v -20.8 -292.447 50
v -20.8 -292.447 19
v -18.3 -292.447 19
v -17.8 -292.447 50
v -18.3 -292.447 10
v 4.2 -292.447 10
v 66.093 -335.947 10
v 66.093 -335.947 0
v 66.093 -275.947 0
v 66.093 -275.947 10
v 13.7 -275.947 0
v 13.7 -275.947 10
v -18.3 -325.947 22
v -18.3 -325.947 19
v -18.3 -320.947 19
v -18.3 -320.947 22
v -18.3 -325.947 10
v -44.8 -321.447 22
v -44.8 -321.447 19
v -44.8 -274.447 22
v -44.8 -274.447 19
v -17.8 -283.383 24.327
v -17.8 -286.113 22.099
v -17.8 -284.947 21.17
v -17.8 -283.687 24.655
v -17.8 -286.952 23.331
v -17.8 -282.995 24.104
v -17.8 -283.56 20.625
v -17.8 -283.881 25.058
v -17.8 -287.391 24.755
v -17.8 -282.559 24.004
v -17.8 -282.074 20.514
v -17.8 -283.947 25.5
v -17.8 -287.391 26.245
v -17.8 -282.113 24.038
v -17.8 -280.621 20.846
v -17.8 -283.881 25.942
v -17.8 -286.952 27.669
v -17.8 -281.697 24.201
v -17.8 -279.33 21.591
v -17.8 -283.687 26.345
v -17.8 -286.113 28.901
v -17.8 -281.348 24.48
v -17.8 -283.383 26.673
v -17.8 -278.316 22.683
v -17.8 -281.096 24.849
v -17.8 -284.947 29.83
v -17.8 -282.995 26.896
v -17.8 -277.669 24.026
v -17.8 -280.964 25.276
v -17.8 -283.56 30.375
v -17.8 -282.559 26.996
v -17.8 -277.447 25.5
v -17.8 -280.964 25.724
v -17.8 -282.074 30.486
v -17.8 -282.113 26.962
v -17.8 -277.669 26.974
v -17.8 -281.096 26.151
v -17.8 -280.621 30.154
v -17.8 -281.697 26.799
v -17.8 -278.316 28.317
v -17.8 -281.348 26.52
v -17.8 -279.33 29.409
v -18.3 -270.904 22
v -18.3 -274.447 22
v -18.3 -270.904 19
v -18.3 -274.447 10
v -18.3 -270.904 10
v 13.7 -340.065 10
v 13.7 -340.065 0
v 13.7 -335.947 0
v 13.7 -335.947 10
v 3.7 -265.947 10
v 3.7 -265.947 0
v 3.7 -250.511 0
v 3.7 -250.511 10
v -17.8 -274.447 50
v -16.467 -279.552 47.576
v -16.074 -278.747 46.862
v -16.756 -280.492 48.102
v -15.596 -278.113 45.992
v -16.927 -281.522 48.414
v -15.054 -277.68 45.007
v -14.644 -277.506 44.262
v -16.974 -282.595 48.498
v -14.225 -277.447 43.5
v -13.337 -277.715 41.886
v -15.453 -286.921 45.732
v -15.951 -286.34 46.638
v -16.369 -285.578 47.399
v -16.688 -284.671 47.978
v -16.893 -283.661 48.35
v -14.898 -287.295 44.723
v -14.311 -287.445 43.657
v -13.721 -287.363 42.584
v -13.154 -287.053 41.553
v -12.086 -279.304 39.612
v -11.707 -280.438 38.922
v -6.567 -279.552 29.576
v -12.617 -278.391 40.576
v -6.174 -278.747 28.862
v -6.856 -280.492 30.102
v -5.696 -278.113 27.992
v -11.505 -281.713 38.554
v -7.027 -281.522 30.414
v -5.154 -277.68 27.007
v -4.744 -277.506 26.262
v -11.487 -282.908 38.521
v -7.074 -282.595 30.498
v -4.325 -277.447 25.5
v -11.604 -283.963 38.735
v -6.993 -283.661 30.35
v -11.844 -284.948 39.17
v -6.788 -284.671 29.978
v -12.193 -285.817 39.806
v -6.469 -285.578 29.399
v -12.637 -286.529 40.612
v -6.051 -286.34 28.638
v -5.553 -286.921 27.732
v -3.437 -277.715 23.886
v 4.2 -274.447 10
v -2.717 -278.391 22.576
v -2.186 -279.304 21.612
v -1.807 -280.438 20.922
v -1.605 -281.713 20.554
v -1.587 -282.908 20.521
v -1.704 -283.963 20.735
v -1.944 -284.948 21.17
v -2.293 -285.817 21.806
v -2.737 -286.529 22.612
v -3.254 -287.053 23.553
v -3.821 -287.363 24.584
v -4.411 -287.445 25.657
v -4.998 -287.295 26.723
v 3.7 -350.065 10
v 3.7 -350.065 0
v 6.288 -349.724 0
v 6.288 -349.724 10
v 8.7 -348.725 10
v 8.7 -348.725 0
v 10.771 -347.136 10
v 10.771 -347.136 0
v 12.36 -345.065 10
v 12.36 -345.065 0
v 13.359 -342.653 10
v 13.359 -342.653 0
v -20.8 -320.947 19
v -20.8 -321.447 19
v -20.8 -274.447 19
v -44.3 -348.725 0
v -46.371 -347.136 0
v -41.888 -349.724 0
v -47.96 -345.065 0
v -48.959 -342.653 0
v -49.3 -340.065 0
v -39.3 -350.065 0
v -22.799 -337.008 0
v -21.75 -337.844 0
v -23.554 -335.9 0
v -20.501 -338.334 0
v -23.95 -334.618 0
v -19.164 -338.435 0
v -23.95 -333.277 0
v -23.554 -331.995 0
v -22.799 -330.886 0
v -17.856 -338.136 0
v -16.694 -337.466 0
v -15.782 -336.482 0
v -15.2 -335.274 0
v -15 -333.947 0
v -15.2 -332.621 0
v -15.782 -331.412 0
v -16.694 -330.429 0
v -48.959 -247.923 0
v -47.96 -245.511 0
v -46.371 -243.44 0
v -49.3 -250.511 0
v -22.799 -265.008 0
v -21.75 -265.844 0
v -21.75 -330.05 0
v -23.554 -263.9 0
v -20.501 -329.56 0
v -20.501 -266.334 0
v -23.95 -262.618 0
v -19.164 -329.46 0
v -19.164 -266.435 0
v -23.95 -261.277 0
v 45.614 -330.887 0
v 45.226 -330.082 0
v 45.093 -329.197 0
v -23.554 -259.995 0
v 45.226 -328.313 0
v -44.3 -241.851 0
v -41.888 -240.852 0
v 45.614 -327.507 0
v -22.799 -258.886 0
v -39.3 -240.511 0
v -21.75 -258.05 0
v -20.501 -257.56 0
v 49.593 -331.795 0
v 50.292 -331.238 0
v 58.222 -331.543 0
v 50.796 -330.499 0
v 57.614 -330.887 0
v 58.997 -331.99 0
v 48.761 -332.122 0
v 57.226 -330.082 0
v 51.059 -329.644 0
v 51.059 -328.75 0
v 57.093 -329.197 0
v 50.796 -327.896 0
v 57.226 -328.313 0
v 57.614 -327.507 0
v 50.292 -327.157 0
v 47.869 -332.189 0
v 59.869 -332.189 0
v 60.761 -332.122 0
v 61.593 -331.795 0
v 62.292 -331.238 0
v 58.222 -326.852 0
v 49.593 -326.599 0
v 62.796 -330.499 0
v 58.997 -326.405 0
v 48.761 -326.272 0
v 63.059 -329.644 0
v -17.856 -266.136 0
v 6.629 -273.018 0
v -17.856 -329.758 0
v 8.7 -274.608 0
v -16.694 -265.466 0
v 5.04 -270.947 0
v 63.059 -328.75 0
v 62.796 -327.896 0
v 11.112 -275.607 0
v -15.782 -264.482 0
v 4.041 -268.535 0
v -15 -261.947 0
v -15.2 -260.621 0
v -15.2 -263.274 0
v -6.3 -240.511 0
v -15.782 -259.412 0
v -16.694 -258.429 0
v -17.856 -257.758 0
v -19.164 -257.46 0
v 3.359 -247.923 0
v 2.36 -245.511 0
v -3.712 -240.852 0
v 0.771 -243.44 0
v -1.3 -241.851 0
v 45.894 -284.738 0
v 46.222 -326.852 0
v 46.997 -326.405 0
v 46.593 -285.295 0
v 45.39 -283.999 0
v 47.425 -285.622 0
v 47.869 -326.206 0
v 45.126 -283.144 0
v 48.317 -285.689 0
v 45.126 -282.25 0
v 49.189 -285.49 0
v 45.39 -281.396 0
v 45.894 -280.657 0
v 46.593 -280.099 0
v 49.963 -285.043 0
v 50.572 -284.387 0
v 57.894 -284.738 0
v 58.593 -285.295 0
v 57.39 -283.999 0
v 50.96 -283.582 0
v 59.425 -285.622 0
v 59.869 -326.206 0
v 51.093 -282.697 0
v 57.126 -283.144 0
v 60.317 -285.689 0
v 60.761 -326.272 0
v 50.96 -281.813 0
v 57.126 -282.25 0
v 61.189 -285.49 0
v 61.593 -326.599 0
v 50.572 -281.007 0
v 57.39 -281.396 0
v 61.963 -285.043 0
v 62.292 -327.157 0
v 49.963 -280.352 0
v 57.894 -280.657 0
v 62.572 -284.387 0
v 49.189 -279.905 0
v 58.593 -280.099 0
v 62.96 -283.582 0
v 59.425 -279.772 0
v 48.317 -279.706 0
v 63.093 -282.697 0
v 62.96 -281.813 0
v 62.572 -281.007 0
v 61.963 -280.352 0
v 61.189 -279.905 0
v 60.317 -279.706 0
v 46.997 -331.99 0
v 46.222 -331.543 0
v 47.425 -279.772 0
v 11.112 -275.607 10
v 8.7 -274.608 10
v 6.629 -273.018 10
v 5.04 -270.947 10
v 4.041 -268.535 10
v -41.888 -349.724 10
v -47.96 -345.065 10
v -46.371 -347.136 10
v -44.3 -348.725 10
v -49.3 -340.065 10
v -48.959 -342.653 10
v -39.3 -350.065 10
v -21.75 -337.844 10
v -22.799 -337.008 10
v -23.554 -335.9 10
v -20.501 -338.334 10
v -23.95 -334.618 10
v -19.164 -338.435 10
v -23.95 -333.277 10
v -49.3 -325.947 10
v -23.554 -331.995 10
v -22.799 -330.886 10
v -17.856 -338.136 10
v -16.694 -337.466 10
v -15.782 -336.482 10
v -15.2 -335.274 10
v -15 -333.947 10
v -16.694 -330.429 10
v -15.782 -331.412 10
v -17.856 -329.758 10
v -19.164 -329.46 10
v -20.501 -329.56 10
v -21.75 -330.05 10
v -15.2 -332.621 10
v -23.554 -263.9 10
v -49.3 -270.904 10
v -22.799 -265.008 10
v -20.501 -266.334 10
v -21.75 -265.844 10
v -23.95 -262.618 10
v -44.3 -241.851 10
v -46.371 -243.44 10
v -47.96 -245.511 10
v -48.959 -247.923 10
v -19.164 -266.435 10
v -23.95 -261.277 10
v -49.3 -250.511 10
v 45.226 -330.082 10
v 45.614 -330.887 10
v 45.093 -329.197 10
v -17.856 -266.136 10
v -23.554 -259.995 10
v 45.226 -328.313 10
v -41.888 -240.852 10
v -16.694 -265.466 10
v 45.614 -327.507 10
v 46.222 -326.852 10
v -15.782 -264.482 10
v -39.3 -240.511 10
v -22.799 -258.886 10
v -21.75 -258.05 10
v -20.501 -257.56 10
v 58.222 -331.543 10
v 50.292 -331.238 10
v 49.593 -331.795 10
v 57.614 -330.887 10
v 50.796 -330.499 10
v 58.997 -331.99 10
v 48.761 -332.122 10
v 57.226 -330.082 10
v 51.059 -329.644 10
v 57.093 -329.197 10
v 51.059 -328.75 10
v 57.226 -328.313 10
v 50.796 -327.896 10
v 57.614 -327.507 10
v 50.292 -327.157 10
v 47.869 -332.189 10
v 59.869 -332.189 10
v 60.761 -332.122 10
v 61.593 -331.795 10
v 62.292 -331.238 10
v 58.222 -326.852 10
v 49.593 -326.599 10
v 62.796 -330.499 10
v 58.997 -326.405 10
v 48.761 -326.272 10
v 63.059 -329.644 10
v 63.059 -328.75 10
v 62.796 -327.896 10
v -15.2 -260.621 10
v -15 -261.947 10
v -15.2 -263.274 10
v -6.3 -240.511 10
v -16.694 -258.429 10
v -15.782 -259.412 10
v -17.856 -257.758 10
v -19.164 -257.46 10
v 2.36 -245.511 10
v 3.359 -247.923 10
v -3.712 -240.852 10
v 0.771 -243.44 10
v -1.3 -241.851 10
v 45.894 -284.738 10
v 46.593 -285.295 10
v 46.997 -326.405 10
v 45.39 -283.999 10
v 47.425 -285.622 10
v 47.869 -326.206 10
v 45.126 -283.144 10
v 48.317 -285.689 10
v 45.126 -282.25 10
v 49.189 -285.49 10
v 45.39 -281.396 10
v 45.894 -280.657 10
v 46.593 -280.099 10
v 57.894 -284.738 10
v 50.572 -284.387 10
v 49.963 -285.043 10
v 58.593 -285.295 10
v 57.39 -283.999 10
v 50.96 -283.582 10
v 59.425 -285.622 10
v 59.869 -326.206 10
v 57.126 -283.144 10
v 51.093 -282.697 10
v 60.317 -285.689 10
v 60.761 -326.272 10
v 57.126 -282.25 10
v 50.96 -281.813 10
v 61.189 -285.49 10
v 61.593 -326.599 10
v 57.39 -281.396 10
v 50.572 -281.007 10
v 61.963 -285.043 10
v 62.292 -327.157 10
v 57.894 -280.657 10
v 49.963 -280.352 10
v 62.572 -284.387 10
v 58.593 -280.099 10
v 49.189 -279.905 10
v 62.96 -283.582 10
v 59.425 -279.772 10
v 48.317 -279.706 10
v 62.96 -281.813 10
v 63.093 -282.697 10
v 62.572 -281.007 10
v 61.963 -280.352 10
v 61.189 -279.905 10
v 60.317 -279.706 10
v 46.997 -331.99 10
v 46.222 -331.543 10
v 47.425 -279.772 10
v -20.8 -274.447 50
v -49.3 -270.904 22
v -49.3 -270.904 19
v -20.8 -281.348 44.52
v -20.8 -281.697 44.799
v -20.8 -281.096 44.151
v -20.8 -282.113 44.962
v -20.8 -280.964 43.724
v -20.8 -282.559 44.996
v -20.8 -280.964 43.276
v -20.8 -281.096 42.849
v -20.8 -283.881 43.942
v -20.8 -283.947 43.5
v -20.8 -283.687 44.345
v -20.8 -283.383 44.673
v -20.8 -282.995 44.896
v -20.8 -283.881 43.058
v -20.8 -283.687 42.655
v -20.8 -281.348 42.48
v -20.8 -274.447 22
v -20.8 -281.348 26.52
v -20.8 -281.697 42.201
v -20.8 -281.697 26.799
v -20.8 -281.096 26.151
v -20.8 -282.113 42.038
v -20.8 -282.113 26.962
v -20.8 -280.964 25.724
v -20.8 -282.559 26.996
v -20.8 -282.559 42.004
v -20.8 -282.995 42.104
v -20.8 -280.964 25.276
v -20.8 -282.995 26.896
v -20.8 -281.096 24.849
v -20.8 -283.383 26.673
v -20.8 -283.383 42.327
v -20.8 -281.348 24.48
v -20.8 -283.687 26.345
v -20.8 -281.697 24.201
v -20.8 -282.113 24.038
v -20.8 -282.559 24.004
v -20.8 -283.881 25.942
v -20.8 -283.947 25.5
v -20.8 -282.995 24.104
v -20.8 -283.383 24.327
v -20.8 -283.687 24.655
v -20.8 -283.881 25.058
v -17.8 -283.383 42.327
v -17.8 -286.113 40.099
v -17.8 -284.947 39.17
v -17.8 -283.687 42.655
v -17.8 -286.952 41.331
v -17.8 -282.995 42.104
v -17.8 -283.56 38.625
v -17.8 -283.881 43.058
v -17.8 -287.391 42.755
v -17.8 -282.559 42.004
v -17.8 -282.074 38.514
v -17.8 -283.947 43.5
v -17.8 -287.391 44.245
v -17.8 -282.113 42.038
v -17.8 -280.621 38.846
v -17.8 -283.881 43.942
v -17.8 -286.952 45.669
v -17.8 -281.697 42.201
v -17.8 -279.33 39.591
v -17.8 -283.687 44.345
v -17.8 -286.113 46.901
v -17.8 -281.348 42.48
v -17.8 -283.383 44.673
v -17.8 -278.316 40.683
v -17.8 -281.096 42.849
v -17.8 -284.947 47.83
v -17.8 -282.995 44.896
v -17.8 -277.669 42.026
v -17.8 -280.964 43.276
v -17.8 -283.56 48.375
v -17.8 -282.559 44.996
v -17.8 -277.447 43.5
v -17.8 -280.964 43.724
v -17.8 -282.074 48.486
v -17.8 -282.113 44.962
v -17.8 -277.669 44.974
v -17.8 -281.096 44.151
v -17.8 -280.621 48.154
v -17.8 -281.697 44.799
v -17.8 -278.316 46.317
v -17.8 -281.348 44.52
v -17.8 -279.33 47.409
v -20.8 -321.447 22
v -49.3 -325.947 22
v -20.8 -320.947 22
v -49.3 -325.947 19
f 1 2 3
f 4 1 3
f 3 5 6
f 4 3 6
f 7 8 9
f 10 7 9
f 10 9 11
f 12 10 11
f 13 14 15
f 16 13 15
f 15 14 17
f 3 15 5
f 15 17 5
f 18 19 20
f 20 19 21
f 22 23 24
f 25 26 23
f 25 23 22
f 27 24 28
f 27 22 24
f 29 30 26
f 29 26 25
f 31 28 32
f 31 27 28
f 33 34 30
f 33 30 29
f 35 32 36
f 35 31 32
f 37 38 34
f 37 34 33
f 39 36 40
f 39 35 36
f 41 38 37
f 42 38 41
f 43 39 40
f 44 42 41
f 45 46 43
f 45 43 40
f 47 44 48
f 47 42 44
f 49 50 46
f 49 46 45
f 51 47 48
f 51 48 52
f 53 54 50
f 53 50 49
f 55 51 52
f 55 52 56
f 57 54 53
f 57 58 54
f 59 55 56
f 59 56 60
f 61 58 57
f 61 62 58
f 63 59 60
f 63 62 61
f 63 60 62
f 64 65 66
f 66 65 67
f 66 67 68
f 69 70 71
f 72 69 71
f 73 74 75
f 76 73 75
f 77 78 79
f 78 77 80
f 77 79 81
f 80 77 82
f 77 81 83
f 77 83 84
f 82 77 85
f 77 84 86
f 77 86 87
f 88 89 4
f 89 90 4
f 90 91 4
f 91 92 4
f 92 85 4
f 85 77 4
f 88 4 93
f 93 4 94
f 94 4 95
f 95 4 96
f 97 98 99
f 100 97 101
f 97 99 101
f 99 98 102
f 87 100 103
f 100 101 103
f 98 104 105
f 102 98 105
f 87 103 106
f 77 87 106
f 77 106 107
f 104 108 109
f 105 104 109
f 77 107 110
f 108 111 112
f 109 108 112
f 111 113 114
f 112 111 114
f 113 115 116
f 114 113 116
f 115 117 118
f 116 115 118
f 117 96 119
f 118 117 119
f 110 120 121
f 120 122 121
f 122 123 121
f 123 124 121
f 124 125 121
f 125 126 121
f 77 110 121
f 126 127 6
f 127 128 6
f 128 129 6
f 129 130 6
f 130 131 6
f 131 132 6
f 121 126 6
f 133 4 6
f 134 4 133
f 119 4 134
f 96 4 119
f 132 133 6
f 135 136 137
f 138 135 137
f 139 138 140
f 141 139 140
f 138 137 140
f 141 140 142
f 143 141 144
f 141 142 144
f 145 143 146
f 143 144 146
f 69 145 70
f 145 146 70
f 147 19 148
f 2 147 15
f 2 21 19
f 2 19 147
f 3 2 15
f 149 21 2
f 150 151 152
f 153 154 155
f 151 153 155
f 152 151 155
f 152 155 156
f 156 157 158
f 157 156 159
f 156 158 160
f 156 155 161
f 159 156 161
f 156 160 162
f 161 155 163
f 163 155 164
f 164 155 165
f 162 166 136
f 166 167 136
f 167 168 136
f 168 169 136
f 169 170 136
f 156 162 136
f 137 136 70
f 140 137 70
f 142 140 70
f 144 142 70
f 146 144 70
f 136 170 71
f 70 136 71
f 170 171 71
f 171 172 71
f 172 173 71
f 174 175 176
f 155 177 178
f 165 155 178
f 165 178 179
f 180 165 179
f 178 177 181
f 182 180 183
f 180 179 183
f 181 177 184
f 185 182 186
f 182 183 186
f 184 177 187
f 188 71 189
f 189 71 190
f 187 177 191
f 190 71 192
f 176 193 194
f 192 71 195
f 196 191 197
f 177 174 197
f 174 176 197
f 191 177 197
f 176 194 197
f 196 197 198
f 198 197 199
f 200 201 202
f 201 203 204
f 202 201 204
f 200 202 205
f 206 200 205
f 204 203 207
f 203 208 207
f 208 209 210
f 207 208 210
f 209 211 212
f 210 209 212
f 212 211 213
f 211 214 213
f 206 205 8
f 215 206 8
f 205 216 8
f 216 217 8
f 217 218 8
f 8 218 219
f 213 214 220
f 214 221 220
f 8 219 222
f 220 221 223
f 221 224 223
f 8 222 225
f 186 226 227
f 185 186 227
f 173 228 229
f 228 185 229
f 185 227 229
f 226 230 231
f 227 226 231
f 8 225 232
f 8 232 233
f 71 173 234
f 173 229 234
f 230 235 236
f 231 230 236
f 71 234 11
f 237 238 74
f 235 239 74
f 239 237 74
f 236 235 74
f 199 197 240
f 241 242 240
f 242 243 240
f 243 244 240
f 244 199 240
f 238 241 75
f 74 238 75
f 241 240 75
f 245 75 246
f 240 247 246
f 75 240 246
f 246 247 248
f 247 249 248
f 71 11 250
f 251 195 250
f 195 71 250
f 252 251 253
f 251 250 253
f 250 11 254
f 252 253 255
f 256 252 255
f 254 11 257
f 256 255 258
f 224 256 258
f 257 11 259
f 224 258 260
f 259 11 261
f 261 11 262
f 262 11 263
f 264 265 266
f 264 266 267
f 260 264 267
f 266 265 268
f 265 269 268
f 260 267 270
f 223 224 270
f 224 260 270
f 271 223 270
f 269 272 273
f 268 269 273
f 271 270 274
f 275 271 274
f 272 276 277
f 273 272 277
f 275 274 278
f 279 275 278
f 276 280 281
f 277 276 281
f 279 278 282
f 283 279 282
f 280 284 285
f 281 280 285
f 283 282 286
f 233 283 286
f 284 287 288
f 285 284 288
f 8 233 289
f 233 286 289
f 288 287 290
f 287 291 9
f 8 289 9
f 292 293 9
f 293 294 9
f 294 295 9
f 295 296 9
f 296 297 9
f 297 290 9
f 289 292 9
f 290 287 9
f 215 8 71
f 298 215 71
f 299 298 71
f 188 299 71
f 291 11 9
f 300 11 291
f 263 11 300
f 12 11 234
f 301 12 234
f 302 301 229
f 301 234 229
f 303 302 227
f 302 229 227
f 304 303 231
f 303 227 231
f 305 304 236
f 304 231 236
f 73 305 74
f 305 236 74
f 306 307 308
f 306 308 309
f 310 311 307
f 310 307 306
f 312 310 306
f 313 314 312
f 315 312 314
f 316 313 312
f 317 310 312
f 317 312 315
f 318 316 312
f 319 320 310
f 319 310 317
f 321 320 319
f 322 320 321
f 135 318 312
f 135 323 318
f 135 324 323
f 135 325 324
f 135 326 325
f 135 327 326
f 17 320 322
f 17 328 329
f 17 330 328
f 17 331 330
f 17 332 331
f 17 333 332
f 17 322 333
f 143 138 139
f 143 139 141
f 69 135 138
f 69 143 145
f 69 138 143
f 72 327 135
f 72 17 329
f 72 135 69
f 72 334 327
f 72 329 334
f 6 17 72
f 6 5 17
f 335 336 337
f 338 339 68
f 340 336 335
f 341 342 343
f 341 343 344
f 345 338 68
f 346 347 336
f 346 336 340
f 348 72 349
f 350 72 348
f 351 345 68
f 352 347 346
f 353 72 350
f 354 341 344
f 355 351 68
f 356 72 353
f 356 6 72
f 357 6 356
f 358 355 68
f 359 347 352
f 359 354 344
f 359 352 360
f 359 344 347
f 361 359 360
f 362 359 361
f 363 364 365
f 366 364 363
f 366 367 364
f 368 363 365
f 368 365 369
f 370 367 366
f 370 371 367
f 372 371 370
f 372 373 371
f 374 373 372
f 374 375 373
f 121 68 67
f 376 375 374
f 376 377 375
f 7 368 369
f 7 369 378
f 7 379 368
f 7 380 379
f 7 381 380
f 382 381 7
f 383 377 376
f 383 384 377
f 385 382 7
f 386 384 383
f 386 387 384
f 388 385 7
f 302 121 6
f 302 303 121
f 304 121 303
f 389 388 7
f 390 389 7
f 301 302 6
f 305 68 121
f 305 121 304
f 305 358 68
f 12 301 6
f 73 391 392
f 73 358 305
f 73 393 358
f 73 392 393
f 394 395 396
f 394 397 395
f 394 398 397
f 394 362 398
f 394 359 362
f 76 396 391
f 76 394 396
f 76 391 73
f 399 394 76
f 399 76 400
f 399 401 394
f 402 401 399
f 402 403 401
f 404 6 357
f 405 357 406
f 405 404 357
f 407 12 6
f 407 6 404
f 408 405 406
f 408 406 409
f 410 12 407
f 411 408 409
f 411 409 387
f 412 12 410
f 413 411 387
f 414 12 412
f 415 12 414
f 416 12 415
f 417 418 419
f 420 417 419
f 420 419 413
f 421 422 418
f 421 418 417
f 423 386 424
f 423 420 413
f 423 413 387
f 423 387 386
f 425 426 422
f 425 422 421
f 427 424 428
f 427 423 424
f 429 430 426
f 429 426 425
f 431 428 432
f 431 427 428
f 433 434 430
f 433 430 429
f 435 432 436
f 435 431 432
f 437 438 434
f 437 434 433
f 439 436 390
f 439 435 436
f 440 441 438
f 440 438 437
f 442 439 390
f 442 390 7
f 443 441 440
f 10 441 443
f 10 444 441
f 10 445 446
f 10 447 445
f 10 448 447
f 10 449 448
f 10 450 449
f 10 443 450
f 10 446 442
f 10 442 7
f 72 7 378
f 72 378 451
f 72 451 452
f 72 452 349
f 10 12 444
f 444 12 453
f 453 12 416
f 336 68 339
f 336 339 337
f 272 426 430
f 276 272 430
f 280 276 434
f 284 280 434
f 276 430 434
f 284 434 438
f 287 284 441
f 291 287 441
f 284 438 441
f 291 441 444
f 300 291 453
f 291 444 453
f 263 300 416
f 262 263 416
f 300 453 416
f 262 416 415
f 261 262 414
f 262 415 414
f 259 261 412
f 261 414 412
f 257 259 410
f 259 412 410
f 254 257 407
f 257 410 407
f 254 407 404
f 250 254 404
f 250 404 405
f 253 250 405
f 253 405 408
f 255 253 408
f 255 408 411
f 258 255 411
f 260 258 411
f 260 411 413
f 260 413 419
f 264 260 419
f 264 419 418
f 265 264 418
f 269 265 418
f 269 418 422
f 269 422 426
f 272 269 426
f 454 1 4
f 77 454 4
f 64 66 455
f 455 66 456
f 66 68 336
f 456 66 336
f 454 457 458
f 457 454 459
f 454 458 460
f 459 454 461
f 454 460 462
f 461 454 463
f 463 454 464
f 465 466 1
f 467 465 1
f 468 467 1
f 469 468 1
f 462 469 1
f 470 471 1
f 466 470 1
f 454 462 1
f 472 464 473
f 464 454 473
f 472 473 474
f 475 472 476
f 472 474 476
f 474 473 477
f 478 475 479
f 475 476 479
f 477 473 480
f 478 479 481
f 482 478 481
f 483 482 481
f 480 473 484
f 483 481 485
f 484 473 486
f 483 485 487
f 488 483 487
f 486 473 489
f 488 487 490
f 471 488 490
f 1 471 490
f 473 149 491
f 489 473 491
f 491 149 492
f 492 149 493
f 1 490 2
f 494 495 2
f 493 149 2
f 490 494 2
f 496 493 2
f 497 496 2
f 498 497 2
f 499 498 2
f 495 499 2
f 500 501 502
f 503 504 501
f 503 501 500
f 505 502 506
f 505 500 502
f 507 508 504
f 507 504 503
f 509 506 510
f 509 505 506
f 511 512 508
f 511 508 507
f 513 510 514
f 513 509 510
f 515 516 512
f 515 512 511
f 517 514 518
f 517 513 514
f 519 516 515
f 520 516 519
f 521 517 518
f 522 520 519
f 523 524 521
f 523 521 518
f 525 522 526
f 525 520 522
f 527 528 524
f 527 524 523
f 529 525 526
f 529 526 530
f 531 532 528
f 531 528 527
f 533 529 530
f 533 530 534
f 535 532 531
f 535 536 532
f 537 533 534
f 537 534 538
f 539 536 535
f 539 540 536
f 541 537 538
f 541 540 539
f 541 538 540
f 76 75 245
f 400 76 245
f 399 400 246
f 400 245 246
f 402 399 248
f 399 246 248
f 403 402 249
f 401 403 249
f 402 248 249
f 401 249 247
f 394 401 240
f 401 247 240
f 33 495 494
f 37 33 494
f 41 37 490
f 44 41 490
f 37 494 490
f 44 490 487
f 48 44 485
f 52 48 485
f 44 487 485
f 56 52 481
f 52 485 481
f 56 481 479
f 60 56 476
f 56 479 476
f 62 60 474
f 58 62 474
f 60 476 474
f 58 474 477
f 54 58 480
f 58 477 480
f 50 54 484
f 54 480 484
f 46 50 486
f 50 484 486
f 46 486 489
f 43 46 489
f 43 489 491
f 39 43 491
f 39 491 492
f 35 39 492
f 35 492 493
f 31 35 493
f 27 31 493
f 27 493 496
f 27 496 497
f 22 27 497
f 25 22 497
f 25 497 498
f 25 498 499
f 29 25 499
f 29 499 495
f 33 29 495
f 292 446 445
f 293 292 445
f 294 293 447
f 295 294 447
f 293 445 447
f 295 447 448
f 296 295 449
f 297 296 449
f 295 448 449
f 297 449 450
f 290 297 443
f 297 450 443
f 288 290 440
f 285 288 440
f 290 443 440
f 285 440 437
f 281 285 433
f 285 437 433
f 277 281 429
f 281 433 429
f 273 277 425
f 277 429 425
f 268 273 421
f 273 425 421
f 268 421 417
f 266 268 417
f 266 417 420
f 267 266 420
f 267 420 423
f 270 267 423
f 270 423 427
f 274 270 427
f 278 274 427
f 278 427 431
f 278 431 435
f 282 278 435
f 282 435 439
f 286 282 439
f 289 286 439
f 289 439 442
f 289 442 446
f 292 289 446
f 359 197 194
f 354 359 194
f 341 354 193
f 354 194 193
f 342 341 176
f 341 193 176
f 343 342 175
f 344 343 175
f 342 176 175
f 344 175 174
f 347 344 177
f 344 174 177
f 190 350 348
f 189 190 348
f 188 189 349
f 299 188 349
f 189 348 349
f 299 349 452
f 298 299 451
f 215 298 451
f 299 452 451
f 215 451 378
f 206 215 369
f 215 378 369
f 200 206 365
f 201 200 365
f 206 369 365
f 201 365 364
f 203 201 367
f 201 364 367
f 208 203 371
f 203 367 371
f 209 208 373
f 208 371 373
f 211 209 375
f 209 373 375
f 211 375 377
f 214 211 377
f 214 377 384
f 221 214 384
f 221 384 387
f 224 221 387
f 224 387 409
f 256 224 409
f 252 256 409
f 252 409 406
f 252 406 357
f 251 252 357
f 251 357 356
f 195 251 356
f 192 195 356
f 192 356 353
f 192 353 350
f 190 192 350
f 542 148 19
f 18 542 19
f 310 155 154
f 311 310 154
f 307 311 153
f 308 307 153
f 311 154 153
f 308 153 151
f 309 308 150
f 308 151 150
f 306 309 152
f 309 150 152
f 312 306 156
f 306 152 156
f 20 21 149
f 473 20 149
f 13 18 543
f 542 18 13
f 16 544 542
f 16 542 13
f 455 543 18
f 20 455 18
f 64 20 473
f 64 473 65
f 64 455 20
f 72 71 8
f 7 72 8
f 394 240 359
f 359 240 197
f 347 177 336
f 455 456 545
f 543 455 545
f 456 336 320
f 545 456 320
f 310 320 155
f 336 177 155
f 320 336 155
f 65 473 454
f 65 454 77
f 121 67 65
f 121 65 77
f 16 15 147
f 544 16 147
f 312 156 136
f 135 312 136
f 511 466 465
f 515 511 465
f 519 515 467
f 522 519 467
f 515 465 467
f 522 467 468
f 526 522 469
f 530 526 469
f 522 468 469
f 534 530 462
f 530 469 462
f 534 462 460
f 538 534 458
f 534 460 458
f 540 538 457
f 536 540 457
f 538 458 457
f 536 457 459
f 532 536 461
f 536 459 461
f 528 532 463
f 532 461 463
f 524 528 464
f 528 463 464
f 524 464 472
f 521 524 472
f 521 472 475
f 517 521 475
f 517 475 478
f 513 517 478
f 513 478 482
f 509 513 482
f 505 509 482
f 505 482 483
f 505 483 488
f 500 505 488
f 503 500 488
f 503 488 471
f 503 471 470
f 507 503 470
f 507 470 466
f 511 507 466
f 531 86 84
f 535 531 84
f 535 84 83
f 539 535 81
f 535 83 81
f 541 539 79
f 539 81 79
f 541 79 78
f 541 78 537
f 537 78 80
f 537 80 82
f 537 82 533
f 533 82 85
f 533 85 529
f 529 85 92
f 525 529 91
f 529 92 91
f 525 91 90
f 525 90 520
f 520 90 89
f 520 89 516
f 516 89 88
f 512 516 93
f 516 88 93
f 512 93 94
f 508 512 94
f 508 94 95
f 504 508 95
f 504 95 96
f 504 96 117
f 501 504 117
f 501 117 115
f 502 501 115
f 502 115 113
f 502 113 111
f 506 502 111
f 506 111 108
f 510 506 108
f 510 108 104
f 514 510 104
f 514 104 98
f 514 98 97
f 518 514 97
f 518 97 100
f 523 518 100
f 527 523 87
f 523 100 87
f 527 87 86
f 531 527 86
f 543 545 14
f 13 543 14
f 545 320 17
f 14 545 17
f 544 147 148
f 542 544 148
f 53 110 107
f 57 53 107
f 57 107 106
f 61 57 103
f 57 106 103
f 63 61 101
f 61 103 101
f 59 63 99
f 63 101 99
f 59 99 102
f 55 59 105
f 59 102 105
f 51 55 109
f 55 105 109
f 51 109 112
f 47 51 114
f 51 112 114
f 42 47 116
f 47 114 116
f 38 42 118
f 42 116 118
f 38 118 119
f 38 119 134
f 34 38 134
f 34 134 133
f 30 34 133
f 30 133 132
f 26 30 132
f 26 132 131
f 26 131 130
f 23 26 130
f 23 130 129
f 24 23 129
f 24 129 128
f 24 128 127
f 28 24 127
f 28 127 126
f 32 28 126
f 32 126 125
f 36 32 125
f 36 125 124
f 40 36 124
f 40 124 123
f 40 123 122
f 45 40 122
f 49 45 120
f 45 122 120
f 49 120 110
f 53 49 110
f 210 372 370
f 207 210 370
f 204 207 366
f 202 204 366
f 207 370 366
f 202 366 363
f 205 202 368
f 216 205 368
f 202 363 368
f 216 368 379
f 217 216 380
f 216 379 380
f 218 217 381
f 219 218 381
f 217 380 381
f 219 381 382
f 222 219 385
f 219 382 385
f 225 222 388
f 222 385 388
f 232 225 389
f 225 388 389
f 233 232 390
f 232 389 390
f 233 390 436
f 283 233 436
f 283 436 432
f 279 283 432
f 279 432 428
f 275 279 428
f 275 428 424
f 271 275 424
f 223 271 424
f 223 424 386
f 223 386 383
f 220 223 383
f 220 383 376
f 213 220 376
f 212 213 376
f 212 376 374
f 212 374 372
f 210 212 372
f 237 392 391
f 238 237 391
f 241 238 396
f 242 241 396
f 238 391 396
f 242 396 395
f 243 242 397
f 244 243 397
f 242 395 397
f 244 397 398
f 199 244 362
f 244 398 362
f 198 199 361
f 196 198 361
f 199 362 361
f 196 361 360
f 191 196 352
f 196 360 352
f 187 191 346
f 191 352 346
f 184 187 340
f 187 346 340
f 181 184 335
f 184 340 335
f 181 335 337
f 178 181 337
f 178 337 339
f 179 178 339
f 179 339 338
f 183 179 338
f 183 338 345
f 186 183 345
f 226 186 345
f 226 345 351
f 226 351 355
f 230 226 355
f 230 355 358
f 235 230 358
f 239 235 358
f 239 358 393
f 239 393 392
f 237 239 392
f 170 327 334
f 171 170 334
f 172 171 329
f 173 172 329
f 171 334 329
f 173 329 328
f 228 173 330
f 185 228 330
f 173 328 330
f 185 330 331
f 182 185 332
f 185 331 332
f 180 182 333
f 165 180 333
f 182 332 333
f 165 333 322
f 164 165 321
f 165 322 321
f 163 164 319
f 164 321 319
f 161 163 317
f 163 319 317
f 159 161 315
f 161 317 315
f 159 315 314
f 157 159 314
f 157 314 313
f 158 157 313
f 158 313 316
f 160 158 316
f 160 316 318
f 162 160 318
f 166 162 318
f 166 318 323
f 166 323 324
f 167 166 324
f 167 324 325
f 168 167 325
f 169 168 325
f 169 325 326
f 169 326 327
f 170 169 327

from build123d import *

# Parameters (mm, degrees)
BOSS_EXTRUDE1_DEPTH = 10
SKETCH1_3_W         = 31
SKETCH1_3_H         = 55.042796233
BOSS_EXTRUDE2_DEPTH = 19
BOSS_EXTRUDE3_DEPTH = 3
SKETCH8_W           = 25
SKETCH8_H           = 18
BOSS_EXTRUDE4_DEPTH = 40
CUT_EXTRUDE2_DEPTH  = 101.93603831
SKETCH11_R          = 1.5
CUT_EXTRUDE3_DEPTH  = 365.137190302
SKETCH12_R          = 5
CUT_EXTRUDE4_DEPTH  = 21.5
SKETCH13_R          = 4.5
CUT_EXTRUDE5_DEPTH  = 359.488203344
SKETCH14_R          = 3
CUT_EXTRUDE6_DEPTH  = 359.488203344


with BuildPart() as part:
    # Sketch1 → Boss-Extrude1 (new body)
    with BuildSketch(Plane.XY):
        with BuildLine():
            ThreePointArc((3.70003333, -250.511159837), (0.771101142, -243.440092025), (-6.29996667, -240.511159837))
            Line((-6.29996667, -240.511159837), (-39.29996667, -240.511159837))
            ThreePointArc((-39.29996667, -240.511159837), (-46.371034482, -243.440092025), (-49.29996667, -250.511159837))
            Line((-49.29996667, -250.511159837), (-49.29996667, -340.06501156))
            ThreePointArc((-49.29996667, -340.06501156), (-46.371034482, -347.136079372), (-39.29996667, -350.06501156))
            Line((-39.29996667, -350.06501156), (3.70003333, -350.06501156))
            ThreePointArc((3.70003333, -350.06501156), (10.771101142, -347.136079372), (13.70003333, -340.06501156))
            Line((13.70003333, -340.06501156), (13.70003333, -335.947269399))
            Line((13.70003333, -335.947269399), (66.09296194, -335.947269399))
            Line((66.09296194, -335.947269399), (66.09296194, -275.947269399))
            Line((66.09296194, -275.947269399), (13.70003333, -275.947269399))
            ThreePointArc((13.70003333, -275.947269399), (6.628965518, -273.018337211), (3.70003333, -265.947269399))
            Line((3.70003333, -265.947269399), (3.70003333, -250.511159837))
        make_face()
    extrude(amount=BOSS_EXTRUDE1_DEPTH)

    # Sketch1<3> → Boss-Extrude2 (add)
    with BuildSketch(Plane.XY):
        with Locations((-33.79996667, -298.425871282)):
            Rectangle(SKETCH1_3_W, SKETCH1_3_H)
    extrude(amount=BOSS_EXTRUDE2_DEPTH)

    # Sketch2 → Boss-Extrude3 (add)
    with BuildSketch(Plane.XY.offset(19)):
        Polygon((-44.79996667, -321.447269399), (-44.79996667, -274.447269399), (-20.79996667, -274.447269399), (-20.79996667, -292.147269399), (-18.29996667, -292.147269399), (-18.29996667, -270.904473166), (-49.29996667, -270.904473166), (-49.29996667, -325.947269399), (-18.29996667, -325.947269399), (-18.29996667, -320.947269399), (-20.79996667, -320.947269399), (-20.79996667, -321.447269399), align=None)
    extrude(amount=BOSS_EXTRUDE3_DEPTH)

    # Sketch8 → Boss-Extrude4 (add)
    with BuildSketch(Plane.XY.offset(10)):
        with Locations((-8.29996667, -283.447269399)):
            Rectangle(SKETCH8_W, SKETCH8_H)
    extrude(amount=BOSS_EXTRUDE4_DEPTH)

    # Sketch9 → Cut-Extrude2 (cut, through all)
    with BuildSketch(Plane.XZ.offset(292.447269399)):
        Polygon((-17.79996667, 50), (4.20003333, 10), (4.20003333, 50), align=None)
    extrude(amount=-CUT_EXTRUDE2_DEPTH, mode=Mode.SUBTRACT)

    # Sketch11 → Cut-Extrude3 (cut, through all)
    with BuildSketch(Plane.ZY.offset(20.79996667)):
        with Locations(Location((43.5, -282.447269399, 0), (0, 0, 270))):
            Circle(SKETCH11_R)
        with Locations(Location((25.5, -282.447269399, 0), (0, 0, 270))):
            Circle(SKETCH11_R)
    extrude(amount=-CUT_EXTRUDE3_DEPTH, mode=Mode.SUBTRACT)

    # Sketch12 → Cut-Extrude4 (cut)
    with BuildSketch(Plane(origin=(3.70003333, 0, 0), x_dir=(0, 0, -1), z_dir=(1, 0, 0))):
        with Locations(Location((-43.5, -282.447269399, 0), (0, 0, 90))):
            Circle(SKETCH12_R)
        with Locations(Location((-25.5, -282.447269399, 0), (0, 0, 90))):
            Circle(SKETCH12_R)
    extrude(amount=-CUT_EXTRUDE4_DEPTH, mode=Mode.SUBTRACT)

    # Sketch13 → Cut-Extrude5 (cut, through all)
    with BuildSketch(Plane.XY.offset(10)):
        with Locations((-19.49996667, -261.947269399)):
            Circle(SKETCH13_R)
        with Locations((-19.49996667, -333.947269399)):
            Circle(SKETCH13_R)
    extrude(amount=-CUT_EXTRUDE5_DEPTH, mode=Mode.SUBTRACT)

    # Sketch14 → Cut-Extrude6 (cut, through all)
    with BuildSketch(Plane.XY.offset(10)):
        with Locations((60.09296194, -282.697269399)):
            Circle(SKETCH14_R)
        with Locations((48.092961938, -282.697269399)):
            Circle(SKETCH14_R)
        with Locations(Location((60.09296194, -329.197269399, 0), (0, 0, 180))):
            Circle(SKETCH14_R)
        with Locations(Location((48.092961938, -329.197269399, 0), (0, 0, 180))):
            Circle(SKETCH14_R)
    extrude(amount=-CUT_EXTRUDE6_DEPTH, mode=Mode.SUBTRACT)


solid = part.part
